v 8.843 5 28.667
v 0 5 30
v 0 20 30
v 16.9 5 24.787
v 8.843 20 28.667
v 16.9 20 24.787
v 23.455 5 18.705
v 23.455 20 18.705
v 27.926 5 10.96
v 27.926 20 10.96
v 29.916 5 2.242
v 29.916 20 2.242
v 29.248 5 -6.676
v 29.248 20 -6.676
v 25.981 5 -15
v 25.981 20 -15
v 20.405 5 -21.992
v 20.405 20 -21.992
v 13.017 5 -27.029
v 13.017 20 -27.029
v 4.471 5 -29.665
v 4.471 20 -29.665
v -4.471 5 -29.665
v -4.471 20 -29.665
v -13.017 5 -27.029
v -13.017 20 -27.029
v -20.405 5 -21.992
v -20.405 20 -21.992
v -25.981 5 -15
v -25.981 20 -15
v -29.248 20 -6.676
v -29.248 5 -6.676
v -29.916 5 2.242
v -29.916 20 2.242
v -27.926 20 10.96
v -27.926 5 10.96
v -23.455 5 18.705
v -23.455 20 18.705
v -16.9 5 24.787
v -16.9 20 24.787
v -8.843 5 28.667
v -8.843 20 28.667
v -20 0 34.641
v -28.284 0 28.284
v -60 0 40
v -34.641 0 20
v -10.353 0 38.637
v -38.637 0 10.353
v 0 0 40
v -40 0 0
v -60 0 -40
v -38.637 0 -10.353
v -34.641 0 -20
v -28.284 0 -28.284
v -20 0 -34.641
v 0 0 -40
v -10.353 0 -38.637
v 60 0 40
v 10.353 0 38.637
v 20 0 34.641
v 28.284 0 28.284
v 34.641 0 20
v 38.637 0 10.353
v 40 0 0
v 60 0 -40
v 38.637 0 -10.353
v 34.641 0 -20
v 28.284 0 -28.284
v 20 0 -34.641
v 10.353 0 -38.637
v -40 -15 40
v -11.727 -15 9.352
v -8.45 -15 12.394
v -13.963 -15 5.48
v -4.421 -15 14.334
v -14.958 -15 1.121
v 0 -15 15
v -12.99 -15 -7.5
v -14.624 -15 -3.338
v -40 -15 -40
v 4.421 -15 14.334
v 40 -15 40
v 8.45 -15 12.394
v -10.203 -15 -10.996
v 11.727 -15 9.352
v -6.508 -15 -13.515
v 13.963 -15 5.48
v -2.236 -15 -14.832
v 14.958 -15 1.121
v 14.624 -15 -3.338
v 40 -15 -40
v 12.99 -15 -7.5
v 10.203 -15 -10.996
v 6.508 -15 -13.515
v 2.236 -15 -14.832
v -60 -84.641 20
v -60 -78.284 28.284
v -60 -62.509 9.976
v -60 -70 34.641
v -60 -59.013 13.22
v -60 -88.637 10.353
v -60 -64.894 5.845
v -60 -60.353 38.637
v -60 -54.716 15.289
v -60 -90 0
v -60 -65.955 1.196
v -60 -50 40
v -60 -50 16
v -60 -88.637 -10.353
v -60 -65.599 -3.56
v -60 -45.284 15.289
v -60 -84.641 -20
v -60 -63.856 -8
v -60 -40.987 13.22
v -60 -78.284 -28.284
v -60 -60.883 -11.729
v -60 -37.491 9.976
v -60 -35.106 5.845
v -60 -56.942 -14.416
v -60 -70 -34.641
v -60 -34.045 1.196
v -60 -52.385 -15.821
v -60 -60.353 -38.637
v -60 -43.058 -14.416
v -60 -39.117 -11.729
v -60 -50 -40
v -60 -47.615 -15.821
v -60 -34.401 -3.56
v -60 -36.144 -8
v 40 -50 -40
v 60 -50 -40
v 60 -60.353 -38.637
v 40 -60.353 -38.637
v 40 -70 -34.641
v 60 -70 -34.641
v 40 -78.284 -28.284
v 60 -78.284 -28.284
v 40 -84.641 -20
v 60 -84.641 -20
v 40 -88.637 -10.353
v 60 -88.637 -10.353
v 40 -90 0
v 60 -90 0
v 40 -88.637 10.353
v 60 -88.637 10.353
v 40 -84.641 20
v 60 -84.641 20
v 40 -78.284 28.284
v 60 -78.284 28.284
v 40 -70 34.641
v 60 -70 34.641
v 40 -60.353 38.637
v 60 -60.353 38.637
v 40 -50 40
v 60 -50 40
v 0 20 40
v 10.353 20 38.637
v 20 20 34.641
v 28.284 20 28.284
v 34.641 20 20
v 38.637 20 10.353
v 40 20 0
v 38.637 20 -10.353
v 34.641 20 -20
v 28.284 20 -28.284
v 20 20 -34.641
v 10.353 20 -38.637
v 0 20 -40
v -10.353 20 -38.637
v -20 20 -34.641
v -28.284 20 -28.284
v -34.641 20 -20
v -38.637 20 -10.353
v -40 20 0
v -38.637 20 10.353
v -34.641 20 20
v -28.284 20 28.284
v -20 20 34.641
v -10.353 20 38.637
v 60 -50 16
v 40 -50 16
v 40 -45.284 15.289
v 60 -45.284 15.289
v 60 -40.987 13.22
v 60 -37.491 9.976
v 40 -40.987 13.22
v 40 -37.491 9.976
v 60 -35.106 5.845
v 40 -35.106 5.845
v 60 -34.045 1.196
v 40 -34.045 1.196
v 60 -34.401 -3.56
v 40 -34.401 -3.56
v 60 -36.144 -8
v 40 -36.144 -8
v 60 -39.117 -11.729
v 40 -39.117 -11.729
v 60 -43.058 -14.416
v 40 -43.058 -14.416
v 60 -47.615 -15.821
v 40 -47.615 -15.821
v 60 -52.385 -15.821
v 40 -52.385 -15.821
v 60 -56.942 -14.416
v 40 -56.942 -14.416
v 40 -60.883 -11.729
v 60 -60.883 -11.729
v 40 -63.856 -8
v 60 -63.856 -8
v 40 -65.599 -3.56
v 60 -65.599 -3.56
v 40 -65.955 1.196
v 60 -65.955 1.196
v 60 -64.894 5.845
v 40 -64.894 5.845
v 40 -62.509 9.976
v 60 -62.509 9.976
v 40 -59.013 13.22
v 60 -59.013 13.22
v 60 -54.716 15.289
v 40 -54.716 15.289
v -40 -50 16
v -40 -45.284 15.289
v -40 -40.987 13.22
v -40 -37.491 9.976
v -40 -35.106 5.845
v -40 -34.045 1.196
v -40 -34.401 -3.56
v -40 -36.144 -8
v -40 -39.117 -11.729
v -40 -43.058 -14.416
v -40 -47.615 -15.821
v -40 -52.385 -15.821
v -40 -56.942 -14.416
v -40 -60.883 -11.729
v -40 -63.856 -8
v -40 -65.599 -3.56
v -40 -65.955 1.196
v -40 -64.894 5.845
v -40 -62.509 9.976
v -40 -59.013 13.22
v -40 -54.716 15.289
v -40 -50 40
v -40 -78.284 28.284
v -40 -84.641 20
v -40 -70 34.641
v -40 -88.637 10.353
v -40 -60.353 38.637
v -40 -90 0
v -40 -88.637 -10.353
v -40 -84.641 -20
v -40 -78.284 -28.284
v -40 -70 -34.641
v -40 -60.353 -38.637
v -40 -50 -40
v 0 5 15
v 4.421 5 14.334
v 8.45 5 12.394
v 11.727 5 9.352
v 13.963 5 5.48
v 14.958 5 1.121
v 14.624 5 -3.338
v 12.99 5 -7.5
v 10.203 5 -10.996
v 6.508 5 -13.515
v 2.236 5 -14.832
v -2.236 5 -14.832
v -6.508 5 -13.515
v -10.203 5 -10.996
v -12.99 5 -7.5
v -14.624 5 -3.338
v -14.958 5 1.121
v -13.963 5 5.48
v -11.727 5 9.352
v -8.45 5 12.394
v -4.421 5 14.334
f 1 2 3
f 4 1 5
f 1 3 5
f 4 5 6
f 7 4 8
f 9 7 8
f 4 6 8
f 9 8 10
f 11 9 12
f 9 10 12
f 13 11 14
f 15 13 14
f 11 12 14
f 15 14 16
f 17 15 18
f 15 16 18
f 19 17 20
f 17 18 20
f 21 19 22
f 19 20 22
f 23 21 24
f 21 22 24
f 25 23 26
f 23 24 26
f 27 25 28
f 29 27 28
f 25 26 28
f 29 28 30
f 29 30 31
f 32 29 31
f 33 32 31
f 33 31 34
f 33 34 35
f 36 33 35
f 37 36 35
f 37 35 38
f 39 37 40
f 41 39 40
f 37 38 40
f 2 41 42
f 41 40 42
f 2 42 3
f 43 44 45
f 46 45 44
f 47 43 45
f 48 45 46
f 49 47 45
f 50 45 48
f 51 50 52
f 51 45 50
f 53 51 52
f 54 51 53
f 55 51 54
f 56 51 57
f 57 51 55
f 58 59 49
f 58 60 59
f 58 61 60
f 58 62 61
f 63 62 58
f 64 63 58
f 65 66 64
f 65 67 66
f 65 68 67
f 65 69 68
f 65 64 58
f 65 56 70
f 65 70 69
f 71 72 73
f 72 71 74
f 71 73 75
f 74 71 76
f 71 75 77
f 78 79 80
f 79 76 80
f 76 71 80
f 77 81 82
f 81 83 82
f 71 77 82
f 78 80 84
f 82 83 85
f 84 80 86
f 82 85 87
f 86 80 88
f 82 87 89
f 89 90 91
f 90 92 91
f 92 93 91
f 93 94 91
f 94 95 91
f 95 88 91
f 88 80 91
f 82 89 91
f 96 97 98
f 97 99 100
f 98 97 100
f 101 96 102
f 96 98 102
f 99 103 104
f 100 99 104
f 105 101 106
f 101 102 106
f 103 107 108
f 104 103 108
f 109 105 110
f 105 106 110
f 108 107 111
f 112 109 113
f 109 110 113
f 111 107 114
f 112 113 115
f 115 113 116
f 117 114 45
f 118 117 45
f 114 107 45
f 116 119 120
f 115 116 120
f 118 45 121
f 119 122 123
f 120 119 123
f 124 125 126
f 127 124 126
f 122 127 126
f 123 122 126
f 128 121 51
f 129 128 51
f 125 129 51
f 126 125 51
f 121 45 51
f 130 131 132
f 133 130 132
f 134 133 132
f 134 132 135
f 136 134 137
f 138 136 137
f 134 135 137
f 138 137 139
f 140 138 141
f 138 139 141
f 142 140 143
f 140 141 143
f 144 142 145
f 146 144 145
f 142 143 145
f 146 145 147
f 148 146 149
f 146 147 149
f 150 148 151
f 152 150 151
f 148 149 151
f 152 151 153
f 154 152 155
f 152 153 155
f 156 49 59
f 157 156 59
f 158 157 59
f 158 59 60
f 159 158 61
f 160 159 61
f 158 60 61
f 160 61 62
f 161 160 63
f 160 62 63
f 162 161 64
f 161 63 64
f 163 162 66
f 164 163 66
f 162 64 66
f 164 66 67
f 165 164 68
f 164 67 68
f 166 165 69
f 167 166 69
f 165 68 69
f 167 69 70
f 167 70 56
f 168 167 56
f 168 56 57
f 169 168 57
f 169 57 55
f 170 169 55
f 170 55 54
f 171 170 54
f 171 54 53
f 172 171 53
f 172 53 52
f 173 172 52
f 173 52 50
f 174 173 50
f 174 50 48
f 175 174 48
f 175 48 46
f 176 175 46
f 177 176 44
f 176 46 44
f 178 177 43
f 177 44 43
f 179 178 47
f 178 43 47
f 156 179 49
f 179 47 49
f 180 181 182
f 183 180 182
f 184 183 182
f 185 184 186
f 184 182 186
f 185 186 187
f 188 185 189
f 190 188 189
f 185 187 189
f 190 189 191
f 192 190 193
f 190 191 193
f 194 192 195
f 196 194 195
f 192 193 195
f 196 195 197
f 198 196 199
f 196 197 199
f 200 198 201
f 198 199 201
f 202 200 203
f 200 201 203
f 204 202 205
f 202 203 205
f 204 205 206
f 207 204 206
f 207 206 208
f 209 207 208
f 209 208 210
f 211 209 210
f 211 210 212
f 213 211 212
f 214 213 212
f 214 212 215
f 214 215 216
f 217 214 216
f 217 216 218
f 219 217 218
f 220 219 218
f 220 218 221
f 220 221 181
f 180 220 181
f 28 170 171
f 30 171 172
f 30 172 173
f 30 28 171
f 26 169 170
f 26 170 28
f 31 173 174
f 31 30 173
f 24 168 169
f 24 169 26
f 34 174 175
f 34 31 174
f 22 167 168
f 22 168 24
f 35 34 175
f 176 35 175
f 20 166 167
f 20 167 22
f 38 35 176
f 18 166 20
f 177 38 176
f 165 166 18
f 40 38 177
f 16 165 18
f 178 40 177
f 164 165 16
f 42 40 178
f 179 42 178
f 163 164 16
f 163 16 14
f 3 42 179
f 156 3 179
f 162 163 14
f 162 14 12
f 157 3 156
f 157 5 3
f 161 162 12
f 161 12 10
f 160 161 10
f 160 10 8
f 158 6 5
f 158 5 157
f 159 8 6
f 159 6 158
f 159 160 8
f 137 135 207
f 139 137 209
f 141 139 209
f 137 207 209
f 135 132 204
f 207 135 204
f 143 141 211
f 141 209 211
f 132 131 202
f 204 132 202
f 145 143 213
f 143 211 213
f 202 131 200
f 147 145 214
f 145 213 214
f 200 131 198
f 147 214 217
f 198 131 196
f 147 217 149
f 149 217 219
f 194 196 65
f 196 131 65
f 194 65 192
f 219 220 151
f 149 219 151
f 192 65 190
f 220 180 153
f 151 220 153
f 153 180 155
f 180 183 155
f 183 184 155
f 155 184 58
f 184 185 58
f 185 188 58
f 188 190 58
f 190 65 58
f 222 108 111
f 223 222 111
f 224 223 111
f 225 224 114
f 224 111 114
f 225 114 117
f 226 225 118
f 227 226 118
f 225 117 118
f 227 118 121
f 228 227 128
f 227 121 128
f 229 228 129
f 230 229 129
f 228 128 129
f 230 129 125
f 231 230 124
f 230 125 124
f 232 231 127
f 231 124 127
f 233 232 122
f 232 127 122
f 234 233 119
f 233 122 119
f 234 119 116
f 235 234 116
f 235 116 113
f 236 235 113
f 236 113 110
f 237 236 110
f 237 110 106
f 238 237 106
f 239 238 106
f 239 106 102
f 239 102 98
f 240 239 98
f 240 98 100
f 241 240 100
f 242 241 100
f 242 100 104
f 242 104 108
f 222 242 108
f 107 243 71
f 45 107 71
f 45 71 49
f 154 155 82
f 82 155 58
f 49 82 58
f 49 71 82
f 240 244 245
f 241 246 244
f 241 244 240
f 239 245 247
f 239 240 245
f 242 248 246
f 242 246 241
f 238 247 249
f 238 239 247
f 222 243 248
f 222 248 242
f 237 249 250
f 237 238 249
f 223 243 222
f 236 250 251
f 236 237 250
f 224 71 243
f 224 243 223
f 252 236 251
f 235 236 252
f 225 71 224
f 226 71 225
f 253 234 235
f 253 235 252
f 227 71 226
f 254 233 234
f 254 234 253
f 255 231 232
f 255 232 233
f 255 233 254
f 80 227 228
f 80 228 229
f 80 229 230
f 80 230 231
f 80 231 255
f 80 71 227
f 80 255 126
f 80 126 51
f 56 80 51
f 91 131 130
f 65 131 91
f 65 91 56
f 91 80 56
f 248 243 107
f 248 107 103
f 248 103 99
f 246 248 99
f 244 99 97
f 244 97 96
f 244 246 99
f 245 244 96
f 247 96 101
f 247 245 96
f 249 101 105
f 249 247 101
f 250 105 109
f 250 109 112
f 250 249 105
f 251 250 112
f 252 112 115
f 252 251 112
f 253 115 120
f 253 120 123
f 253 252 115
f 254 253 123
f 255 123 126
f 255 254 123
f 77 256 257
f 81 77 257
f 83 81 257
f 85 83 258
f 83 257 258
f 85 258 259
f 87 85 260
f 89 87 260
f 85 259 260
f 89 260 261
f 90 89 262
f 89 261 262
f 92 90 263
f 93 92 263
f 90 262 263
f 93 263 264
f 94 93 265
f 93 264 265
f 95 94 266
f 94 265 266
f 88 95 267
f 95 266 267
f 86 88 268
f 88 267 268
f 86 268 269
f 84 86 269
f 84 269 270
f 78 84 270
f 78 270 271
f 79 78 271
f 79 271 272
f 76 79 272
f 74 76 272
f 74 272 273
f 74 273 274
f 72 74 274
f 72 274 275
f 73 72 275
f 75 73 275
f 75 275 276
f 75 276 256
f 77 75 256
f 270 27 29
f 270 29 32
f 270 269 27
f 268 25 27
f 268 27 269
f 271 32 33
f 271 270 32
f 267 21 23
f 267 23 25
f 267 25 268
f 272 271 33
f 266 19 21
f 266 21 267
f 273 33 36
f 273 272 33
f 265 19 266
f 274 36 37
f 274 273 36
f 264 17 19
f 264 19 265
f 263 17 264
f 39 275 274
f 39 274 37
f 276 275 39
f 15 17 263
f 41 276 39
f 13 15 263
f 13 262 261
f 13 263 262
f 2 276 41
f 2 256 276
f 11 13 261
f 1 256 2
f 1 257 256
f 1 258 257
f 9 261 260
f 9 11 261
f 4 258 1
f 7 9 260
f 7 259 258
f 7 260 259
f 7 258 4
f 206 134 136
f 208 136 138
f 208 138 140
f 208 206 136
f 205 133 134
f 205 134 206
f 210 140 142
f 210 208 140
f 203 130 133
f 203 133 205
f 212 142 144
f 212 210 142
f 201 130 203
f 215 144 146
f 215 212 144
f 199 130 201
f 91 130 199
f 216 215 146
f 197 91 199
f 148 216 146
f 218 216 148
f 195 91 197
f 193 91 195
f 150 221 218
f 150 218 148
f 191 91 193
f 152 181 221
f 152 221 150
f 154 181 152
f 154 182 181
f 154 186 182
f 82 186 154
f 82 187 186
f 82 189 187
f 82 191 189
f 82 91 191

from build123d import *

# Parameters (mm, degrees)
SKETCH1_W           = 120
SKETCH1_H           = 80
BOSS_EXTRUDE1_DEPTH = 15
SKETCH2_R           = 40
BOSS_EXTRUDE2_DEPTH = 20
SKETCH4_R           = 30
CUT_EXTRUDE1_DEPTH  = 15
SKETCH5_R           = 15
CUT_EXTRUDE2_DEPTH  = 42
SKETCH7_W           = 80
SKETCH7_H           = 35
BOSS_EXTRUDE3_DEPTH = 20
BOSS_EXTRUDE4_START = -20
SKETCH8_W           = 80
SKETCH8_H           = 35
BOSS_EXTRUDE4_DEPTH = 20
SKETCH9_R           = 16
CUT_EXTRUDE3_DEPTH  = 139


with BuildPart() as part:
    # Sketch1 → Boss-Extrude1 (new body)
    with BuildSketch(Plane(origin=(0, 0, 0), x_dir=(1, 0, 0), z_dir=(0, 1, 0))):
        Rectangle(SKETCH1_W, SKETCH1_H)
    extrude(amount=-BOSS_EXTRUDE1_DEPTH)

    # Sketch2 → Boss-Extrude2 (add)
    with BuildSketch(Plane(origin=(0, 0, 0), x_dir=(1, 0, 0), z_dir=(0, 1, 0))):
        with Locations(Location((0, 0, 0), (0, 0, 270))):
            Circle(SKETCH2_R)
    extrude(amount=BOSS_EXTRUDE2_DEPTH)

    # Sketch4 → Cut-Extrude1 (cut)
    with BuildSketch(Plane(origin=(0, 20, 0), x_dir=(1, 0, 0), z_dir=(0, 1, 0))):
        with Locations(Location((0, 0, 0), (0, 0, 270))):
            Circle(SKETCH4_R)
    extrude(amount=-CUT_EXTRUDE1_DEPTH, mode=Mode.SUBTRACT)

    # Sketch5 → Cut-Extrude2 (cut)
    with BuildSketch(Plane(origin=(0, 5, 0), x_dir=(1, 0, 0), z_dir=(0, 1, 0))):
        with Locations(Location((0, 0, 0), (0, 0, 270))):
            Circle(SKETCH5_R)
    extrude(amount=-CUT_EXTRUDE2_DEPTH, mode=Mode.SUBTRACT)

    # Sketch7 → Boss-Extrude3 (add)
    with BuildSketch(Plane(origin=(60, 0, 0), x_dir=(0, 0, -1), z_dir=(1, 0, 0))):
        with BuildLine():
            Line((-40, -50), (40, -50))
            ThreePointArc((40, -50), (0, -90), (-40, -50))
        make_face()
        with Locations((0, -32.5)):
            Rectangle(SKETCH7_W, SKETCH7_H)
    extrude(amount=-BOSS_EXTRUDE3_DEPTH)

    # Sketch8 → Boss-Extrude4 (add)
    with BuildSketch(Plane.ZY.offset(60).offset(BOSS_EXTRUDE4_START)):
        with BuildLine():
            Line((-40, -50), (40, -50))
            ThreePointArc((40, -50), (0, -90), (-40, -50))
        make_face()
        with Locations((0, -32.5)):
            Rectangle(SKETCH8_W, SKETCH8_H)
    extrude(amount=BOSS_EXTRUDE4_DEPTH)

    # Sketch9 → Cut-Extrude3 (cut)
    with BuildSketch(Plane.ZY.offset(60)):
        with Locations((0, -50)):
            Circle(SKETCH9_R)
    extrude(amount=-CUT_EXTRUDE3_DEPTH, mode=Mode.SUBTRACT)


solid = part.part
